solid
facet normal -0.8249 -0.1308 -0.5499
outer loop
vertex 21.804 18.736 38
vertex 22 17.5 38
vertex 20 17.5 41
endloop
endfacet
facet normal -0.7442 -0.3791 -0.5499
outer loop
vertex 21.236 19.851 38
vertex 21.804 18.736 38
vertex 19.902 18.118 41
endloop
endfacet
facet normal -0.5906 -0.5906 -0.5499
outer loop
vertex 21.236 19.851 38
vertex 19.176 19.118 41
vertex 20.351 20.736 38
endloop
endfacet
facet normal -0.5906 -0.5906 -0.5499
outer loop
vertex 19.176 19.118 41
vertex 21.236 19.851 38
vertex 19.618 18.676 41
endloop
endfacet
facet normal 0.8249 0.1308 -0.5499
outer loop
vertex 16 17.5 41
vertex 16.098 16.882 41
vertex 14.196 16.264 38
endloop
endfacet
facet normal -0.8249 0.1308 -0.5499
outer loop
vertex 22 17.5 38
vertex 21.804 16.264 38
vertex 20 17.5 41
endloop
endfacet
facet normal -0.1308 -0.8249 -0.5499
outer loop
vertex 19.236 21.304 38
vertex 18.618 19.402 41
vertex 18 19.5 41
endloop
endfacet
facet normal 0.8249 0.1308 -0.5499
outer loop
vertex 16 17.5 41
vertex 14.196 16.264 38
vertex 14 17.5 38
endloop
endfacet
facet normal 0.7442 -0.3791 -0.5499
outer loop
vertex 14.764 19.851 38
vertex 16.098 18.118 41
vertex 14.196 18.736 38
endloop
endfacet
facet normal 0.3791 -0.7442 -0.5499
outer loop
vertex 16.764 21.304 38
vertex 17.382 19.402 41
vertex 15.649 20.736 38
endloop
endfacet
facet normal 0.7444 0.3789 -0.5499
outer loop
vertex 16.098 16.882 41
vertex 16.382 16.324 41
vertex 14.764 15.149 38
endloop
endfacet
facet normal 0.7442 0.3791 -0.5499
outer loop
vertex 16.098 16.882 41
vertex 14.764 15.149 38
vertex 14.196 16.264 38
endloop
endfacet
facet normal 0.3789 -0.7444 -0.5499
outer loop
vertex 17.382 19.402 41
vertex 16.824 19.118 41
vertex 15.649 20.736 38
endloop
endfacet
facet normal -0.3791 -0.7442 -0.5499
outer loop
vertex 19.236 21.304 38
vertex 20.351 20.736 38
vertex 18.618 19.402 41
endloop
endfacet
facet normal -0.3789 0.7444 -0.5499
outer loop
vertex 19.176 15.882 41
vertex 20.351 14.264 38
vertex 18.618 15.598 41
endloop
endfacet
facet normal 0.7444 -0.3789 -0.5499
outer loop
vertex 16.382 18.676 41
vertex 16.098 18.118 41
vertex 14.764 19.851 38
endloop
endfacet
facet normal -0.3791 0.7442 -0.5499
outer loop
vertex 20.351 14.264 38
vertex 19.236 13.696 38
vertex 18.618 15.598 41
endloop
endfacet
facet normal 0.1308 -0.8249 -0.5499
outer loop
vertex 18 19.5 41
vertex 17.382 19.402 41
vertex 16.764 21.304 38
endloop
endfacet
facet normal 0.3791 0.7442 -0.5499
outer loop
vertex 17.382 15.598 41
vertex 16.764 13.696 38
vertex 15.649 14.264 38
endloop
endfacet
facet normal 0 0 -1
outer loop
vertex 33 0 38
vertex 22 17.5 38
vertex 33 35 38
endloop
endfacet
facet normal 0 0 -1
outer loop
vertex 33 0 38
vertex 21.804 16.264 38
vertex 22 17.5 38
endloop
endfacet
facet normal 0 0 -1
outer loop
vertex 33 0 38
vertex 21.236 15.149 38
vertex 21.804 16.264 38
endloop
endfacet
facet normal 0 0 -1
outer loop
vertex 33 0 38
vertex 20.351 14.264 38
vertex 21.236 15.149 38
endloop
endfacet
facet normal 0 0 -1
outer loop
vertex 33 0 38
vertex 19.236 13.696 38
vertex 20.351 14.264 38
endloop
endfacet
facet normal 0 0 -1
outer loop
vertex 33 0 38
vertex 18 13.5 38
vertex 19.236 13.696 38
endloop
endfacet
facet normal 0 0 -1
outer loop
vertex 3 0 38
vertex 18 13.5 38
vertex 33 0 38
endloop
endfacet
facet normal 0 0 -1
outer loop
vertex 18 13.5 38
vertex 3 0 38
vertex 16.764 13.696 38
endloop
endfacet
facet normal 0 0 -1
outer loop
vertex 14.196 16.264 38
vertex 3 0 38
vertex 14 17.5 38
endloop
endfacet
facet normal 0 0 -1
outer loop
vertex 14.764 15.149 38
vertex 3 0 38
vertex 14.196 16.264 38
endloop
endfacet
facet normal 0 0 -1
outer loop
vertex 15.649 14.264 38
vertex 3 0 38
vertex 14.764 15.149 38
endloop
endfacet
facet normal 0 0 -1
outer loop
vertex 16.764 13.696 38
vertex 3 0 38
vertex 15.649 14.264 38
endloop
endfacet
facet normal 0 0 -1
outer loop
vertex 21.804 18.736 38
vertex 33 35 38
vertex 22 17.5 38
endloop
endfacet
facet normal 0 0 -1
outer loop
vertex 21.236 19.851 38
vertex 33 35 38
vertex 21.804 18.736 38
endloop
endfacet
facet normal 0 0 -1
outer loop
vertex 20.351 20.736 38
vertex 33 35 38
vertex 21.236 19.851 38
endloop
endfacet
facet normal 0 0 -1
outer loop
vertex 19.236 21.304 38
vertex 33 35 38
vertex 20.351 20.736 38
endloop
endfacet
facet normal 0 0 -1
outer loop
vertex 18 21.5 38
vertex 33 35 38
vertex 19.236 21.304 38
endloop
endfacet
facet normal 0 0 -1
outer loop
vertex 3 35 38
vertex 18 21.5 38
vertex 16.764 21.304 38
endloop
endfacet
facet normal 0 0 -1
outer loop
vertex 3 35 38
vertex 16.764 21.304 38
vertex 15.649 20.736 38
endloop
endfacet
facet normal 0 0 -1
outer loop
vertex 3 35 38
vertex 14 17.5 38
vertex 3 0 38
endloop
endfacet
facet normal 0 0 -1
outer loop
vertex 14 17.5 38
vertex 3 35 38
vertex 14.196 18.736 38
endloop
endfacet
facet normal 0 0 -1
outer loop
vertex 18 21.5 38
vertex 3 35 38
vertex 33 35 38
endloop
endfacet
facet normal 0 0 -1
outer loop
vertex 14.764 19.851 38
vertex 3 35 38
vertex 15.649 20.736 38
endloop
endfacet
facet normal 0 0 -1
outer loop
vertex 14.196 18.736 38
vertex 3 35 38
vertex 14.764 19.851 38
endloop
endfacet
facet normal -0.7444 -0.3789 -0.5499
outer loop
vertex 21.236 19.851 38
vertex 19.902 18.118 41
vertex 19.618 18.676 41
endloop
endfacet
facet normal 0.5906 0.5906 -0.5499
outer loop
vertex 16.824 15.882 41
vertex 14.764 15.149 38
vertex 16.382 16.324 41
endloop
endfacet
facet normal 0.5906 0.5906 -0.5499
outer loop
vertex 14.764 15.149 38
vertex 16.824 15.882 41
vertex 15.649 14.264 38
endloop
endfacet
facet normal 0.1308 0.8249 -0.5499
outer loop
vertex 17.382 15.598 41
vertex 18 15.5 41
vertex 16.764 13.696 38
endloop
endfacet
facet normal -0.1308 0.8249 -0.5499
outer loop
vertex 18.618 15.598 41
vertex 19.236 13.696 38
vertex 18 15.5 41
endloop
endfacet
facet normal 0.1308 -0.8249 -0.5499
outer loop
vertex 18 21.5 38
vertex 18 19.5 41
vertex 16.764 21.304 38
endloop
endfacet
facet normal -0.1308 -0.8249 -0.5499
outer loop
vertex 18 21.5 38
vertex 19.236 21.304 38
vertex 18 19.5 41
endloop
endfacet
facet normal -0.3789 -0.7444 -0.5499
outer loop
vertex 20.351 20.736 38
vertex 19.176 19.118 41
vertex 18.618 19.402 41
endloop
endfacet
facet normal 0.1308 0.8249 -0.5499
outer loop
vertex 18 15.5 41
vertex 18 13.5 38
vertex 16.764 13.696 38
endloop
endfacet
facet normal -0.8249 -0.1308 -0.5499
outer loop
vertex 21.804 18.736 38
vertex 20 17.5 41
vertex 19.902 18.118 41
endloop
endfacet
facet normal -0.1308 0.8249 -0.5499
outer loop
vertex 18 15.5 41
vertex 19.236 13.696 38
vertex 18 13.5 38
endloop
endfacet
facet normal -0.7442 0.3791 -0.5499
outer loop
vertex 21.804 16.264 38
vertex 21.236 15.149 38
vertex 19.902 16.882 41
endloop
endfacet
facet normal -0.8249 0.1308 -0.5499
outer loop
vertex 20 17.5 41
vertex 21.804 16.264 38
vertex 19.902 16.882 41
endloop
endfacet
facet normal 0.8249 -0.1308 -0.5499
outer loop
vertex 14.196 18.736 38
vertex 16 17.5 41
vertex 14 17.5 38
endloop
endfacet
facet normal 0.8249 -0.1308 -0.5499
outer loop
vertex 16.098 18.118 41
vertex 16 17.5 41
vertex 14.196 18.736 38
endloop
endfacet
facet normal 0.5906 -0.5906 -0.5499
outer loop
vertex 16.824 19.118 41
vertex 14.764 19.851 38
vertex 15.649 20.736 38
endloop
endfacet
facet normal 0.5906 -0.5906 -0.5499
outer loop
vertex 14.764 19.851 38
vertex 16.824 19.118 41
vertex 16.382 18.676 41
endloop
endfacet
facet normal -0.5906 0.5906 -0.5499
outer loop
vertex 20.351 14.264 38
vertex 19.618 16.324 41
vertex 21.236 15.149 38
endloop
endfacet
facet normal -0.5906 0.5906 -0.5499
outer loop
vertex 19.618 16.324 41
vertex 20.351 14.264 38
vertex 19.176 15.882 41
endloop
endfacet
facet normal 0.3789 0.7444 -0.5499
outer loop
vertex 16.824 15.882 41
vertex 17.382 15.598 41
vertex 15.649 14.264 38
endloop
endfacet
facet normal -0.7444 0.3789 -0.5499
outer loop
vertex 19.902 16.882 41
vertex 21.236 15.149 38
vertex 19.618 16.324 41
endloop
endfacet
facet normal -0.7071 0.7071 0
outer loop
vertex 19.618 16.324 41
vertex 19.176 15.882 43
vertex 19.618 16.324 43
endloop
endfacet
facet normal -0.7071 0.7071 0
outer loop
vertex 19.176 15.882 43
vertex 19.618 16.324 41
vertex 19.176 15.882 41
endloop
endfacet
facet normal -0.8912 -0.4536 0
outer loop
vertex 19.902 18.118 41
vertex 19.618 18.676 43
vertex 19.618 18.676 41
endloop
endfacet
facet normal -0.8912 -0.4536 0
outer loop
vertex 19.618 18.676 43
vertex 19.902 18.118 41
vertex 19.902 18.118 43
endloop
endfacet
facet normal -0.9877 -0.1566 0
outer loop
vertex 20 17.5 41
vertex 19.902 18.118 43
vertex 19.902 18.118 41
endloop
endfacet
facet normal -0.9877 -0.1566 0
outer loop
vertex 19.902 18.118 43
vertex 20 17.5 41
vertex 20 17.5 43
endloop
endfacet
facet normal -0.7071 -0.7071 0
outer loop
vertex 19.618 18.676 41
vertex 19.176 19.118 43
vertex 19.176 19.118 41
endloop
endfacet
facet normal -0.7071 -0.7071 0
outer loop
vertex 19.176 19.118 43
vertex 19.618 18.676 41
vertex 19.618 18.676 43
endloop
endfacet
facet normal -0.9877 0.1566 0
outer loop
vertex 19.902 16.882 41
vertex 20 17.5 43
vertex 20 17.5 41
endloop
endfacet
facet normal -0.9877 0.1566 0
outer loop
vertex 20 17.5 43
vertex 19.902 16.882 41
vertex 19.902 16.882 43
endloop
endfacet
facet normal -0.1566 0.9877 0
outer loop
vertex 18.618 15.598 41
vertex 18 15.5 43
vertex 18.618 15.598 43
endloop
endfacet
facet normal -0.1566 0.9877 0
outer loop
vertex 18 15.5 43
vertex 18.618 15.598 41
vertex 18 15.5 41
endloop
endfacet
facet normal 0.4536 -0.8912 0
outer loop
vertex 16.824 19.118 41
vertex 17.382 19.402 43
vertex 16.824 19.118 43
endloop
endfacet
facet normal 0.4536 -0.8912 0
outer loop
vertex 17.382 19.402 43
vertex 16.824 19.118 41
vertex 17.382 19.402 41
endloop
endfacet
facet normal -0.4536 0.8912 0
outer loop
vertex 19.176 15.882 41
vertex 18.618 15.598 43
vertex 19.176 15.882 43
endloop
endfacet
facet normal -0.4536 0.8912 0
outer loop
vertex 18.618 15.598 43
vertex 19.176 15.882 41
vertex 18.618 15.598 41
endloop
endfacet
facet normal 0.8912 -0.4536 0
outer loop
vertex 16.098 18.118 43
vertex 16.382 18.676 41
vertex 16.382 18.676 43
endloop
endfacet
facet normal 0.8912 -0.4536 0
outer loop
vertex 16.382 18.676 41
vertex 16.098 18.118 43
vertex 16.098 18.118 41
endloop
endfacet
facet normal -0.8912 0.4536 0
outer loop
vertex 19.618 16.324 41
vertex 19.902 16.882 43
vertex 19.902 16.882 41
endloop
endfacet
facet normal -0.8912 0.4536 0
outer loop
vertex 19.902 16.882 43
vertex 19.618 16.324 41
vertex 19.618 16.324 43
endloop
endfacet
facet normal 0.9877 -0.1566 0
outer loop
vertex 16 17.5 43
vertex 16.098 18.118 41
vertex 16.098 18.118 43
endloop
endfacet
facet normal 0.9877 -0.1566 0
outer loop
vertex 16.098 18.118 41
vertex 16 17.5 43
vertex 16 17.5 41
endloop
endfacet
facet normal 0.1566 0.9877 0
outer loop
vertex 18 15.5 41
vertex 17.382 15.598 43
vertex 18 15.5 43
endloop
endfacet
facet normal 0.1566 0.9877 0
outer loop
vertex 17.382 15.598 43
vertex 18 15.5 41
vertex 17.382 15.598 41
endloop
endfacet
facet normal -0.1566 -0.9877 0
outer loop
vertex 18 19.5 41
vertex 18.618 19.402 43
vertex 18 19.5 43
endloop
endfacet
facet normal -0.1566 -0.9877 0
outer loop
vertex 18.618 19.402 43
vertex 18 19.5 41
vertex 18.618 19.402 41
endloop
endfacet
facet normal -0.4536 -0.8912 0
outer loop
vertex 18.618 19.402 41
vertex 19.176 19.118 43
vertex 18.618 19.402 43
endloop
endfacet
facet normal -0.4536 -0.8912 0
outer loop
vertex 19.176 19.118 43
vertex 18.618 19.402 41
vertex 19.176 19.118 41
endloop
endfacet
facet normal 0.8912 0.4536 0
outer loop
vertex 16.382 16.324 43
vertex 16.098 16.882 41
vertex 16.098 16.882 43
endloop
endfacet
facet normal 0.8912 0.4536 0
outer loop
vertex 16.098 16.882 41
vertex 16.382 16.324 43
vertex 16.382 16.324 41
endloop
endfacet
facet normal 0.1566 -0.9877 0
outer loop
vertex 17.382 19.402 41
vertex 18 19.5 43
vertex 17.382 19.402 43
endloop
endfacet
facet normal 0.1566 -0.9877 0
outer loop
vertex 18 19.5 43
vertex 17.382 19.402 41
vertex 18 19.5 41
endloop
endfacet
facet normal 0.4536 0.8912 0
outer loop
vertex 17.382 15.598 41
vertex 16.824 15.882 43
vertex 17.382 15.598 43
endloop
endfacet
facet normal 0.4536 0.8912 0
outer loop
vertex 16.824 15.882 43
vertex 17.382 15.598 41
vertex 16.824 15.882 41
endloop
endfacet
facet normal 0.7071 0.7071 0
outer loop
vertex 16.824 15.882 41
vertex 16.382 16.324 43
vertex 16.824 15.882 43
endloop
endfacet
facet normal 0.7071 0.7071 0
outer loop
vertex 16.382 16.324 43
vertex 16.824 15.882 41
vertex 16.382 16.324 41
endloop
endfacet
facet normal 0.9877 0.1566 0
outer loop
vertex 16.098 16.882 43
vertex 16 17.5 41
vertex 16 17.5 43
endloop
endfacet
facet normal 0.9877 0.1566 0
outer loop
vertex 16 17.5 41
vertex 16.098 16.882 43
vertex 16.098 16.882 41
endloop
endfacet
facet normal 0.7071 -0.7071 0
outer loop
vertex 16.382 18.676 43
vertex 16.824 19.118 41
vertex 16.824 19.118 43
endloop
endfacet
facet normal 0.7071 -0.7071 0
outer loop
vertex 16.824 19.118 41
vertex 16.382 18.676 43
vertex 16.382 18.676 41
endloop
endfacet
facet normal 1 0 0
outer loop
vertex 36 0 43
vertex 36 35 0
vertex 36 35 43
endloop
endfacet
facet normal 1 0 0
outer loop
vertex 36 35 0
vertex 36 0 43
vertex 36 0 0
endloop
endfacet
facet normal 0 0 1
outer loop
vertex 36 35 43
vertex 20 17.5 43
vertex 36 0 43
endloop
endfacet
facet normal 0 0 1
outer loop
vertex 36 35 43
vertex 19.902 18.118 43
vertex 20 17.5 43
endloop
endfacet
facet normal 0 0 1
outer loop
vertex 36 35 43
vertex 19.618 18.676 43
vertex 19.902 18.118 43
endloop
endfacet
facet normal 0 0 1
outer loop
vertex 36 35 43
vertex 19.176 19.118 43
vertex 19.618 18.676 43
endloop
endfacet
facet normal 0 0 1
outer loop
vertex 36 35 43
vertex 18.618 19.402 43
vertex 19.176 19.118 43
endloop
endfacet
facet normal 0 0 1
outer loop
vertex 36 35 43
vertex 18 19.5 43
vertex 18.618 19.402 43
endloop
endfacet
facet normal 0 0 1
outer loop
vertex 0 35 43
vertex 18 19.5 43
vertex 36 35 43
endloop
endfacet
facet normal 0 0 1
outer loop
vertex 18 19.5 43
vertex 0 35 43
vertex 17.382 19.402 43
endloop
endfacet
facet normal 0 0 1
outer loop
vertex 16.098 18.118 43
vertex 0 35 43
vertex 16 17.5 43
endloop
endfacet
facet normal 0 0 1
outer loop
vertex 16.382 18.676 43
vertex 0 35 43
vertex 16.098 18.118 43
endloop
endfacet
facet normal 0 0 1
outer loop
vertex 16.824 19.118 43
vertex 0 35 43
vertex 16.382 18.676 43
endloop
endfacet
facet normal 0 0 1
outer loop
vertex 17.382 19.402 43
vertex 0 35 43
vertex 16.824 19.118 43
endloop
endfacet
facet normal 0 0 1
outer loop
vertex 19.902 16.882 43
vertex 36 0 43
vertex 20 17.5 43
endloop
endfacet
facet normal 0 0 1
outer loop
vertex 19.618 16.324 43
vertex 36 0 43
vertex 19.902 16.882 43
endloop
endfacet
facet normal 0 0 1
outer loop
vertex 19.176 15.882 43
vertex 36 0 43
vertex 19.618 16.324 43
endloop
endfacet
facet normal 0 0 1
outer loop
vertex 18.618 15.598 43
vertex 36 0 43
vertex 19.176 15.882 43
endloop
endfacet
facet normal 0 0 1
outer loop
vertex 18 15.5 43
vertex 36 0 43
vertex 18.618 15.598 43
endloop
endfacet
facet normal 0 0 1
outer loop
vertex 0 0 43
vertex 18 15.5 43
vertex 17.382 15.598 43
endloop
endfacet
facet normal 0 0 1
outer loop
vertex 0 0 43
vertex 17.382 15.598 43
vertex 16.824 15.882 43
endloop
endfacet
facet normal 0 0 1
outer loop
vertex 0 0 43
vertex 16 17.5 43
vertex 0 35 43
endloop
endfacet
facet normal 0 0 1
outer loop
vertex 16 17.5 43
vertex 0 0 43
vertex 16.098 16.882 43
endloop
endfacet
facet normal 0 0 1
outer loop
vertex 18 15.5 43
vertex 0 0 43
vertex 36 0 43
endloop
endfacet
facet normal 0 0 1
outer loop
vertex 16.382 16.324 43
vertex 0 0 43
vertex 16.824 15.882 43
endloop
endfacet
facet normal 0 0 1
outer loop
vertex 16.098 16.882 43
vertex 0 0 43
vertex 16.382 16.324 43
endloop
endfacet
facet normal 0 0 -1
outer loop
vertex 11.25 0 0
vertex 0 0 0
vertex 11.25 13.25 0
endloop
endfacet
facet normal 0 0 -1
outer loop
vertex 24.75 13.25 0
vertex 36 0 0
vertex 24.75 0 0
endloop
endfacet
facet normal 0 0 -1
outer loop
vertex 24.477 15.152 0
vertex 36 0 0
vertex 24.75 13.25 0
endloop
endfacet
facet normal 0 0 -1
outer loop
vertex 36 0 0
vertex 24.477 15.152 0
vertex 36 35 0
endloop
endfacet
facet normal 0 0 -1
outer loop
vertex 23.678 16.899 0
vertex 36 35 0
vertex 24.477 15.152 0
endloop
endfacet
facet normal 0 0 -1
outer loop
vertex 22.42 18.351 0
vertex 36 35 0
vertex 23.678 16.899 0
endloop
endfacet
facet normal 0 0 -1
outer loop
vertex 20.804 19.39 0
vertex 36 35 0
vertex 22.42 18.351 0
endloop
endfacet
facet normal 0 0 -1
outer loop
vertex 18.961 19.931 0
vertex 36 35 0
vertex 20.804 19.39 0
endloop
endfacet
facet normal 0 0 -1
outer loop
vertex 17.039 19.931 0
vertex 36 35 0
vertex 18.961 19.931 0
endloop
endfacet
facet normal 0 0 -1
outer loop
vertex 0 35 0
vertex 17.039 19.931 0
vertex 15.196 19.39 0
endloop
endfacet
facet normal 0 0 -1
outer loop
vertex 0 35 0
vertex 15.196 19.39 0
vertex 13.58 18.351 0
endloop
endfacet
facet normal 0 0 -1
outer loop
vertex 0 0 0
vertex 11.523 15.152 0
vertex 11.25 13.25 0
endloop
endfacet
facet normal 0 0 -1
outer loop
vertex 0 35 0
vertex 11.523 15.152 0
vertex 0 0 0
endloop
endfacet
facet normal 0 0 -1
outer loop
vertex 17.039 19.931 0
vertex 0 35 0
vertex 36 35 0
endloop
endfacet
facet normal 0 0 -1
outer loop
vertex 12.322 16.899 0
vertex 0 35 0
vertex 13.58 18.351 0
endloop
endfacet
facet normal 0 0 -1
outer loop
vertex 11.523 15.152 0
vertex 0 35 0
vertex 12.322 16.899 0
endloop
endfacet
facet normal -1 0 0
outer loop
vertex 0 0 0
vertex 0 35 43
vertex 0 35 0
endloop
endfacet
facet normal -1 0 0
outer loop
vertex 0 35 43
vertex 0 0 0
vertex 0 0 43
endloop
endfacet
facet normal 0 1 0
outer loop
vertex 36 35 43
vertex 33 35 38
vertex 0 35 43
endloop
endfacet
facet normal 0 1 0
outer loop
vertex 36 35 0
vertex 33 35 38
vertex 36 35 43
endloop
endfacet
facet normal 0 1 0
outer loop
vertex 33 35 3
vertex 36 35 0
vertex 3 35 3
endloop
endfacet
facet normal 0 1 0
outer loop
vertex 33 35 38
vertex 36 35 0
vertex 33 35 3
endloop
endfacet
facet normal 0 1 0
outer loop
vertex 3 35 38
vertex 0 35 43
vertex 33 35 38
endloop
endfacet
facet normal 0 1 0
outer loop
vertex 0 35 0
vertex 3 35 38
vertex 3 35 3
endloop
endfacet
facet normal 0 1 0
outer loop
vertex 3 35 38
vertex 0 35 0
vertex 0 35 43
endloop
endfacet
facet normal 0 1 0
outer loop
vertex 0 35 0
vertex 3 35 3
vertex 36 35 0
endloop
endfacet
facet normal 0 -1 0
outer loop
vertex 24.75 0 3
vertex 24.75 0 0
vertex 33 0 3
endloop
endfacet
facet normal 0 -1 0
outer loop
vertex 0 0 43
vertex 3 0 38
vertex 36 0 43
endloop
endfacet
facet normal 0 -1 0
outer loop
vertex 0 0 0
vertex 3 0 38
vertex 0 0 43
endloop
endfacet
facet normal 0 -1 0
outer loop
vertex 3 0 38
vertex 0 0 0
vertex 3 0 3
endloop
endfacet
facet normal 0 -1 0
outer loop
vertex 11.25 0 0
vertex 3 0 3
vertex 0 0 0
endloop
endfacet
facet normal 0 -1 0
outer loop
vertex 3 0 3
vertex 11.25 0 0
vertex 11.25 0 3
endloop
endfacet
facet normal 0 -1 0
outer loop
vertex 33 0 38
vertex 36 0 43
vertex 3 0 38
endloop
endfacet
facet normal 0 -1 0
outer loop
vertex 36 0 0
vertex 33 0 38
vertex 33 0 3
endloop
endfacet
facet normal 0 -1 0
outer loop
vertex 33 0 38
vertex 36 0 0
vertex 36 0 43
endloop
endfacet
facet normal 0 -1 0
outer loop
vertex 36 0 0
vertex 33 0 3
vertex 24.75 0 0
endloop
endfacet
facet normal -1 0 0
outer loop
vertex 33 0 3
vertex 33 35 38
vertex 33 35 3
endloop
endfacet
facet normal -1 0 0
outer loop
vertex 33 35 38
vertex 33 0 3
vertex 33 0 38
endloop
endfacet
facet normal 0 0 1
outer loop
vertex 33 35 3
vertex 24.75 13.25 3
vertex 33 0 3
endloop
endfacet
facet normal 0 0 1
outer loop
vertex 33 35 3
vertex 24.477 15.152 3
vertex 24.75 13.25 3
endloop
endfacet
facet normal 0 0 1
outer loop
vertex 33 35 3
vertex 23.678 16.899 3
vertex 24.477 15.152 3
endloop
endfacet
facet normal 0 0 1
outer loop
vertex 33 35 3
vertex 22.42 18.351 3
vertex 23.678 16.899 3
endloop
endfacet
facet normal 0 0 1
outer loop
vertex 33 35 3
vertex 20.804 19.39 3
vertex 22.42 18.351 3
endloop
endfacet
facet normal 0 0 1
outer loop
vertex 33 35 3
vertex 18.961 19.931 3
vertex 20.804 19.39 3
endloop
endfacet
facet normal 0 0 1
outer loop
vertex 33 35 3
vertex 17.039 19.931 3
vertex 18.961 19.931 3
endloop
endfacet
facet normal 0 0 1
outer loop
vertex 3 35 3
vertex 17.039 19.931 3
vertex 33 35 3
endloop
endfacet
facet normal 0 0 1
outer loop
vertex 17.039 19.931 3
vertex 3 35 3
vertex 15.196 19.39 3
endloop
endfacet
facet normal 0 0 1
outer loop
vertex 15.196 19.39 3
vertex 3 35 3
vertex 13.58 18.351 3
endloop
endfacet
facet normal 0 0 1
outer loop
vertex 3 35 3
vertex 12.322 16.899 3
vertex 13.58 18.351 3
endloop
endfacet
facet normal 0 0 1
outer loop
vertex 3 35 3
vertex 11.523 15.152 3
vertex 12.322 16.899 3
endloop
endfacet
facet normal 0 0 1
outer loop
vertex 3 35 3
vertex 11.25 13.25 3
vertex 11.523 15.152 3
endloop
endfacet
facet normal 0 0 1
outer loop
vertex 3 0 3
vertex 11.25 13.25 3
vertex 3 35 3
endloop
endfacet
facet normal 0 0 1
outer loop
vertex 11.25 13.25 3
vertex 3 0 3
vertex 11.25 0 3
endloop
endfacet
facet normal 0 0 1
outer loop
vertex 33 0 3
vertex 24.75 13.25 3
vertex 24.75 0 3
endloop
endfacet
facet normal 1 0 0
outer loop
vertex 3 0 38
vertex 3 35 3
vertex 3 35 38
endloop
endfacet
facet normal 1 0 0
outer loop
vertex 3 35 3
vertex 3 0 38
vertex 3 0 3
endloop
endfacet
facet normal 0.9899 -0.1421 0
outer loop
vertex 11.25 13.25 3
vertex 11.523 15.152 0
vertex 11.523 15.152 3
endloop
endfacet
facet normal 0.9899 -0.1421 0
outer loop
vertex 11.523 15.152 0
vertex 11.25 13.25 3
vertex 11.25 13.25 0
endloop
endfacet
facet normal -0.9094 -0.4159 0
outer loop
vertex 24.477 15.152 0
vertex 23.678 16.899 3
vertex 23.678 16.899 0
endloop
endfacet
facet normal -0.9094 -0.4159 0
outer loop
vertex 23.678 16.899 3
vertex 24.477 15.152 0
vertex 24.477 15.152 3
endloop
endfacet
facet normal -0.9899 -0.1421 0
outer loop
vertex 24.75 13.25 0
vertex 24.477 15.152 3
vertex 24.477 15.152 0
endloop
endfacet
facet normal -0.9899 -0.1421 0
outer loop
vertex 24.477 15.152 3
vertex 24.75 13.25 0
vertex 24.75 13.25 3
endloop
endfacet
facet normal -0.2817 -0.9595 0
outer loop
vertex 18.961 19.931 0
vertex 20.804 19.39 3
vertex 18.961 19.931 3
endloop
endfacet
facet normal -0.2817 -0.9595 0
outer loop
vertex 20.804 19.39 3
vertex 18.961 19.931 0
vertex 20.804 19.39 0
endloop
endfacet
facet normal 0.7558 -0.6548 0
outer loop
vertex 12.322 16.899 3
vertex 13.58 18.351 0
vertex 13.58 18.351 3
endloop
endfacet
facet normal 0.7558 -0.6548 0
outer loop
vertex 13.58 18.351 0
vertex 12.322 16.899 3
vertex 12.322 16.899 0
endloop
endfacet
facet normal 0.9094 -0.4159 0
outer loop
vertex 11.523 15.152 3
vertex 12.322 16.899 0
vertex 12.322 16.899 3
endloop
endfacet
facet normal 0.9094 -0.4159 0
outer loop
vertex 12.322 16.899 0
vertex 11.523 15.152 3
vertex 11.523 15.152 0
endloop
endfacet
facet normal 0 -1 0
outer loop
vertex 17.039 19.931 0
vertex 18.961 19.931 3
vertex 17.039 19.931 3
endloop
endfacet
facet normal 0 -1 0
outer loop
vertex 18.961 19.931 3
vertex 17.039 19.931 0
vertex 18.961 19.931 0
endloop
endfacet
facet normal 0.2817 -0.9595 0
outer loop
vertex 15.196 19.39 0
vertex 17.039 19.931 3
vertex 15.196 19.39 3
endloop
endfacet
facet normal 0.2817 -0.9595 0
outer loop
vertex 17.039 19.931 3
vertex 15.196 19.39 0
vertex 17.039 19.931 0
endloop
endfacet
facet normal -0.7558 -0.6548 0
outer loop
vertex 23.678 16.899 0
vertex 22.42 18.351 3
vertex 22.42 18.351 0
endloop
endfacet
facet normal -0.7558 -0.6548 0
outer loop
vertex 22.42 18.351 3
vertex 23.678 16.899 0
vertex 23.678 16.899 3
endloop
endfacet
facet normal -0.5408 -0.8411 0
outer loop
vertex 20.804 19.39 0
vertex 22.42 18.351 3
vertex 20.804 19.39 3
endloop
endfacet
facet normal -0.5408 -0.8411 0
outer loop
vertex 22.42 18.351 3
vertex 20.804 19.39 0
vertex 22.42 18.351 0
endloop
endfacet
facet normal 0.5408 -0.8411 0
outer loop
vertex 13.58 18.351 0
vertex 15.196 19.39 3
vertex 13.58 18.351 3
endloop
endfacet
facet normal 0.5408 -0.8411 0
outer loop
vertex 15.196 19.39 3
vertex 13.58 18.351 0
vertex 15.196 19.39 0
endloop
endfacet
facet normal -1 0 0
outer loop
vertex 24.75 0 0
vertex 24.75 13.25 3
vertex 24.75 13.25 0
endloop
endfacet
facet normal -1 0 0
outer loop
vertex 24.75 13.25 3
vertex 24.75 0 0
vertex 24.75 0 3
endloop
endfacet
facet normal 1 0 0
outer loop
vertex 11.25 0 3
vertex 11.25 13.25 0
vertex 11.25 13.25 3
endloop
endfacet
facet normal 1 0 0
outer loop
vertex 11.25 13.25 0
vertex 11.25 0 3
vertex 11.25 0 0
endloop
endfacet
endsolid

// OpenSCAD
// 5/8 spigot holder




slot_height = 35;  // height of the battery + tool's base with some margin
depth = 35;  // total depth of the mount

slot_width = 30;

cut_out_width = 13.5;
cut_out_depth = 20;

side_walls_width = 3;

top_width = 5;

bottom_width = 3;


//------

total_height = slot_height + top_width + bottom_width;
total_width = slot_width + 2 * side_walls_width;

screw_z_offset = slot_height + bottom_width;
screw_x_offset = 0.5 * total_width;
screw_x_offset_1 = 0.5 * (total_width - cut_out_width);
screw_x_offset_2 = 0.5 * (total_width + cut_out_width);

middle_screw_depths = [0.5];

front_screw_depth = 15;

module cage() {
  difference() {
      cube([total_width, depth, total_height]);
      translate([side_walls_width, 0, bottom_width]) cube([slot_width, depth, slot_height]);
      translate([0.5*total_width, cut_out_depth-0.5*cut_out_width, 0])
        cylinder(d=cut_out_width, h=bottom_width);
      translate([0.5*(total_width-cut_out_width), 0, 0])
        cube([cut_out_width, cut_out_depth-0.5*cut_out_width, bottom_width]);
      //translate([screw_x_offset, cut_out_depth, screw_z_offset]) screw_countersunk();
      //translate([screw_x_offset_1, front_screw_depth, screw_z_offset]) screw_countersunk();
      //translate([screw_x_offset_2, front_screw_depth, screw_z_offset]) screw_countersunk();
      for (i = middle_screw_depths)
        translate([screw_x_offset, i*depth, screw_z_offset]) screw_countersunk();
  }
}

module screw_countersunk(
        l=20,   //length
        dh = 8,   //head dia
        lh = 3,   //head length
        ds = 4,  //shaft dia
        $fn=20,
        )
{
    union() {
        cylinder(h=lh, r1=dh/2, r2=ds/2);
        cylinder(h=l, d=ds);
    }
}

cage();
//translate([screw_x_offset, cut_out_depth, screw_z_offset]) screw_countersunk();
